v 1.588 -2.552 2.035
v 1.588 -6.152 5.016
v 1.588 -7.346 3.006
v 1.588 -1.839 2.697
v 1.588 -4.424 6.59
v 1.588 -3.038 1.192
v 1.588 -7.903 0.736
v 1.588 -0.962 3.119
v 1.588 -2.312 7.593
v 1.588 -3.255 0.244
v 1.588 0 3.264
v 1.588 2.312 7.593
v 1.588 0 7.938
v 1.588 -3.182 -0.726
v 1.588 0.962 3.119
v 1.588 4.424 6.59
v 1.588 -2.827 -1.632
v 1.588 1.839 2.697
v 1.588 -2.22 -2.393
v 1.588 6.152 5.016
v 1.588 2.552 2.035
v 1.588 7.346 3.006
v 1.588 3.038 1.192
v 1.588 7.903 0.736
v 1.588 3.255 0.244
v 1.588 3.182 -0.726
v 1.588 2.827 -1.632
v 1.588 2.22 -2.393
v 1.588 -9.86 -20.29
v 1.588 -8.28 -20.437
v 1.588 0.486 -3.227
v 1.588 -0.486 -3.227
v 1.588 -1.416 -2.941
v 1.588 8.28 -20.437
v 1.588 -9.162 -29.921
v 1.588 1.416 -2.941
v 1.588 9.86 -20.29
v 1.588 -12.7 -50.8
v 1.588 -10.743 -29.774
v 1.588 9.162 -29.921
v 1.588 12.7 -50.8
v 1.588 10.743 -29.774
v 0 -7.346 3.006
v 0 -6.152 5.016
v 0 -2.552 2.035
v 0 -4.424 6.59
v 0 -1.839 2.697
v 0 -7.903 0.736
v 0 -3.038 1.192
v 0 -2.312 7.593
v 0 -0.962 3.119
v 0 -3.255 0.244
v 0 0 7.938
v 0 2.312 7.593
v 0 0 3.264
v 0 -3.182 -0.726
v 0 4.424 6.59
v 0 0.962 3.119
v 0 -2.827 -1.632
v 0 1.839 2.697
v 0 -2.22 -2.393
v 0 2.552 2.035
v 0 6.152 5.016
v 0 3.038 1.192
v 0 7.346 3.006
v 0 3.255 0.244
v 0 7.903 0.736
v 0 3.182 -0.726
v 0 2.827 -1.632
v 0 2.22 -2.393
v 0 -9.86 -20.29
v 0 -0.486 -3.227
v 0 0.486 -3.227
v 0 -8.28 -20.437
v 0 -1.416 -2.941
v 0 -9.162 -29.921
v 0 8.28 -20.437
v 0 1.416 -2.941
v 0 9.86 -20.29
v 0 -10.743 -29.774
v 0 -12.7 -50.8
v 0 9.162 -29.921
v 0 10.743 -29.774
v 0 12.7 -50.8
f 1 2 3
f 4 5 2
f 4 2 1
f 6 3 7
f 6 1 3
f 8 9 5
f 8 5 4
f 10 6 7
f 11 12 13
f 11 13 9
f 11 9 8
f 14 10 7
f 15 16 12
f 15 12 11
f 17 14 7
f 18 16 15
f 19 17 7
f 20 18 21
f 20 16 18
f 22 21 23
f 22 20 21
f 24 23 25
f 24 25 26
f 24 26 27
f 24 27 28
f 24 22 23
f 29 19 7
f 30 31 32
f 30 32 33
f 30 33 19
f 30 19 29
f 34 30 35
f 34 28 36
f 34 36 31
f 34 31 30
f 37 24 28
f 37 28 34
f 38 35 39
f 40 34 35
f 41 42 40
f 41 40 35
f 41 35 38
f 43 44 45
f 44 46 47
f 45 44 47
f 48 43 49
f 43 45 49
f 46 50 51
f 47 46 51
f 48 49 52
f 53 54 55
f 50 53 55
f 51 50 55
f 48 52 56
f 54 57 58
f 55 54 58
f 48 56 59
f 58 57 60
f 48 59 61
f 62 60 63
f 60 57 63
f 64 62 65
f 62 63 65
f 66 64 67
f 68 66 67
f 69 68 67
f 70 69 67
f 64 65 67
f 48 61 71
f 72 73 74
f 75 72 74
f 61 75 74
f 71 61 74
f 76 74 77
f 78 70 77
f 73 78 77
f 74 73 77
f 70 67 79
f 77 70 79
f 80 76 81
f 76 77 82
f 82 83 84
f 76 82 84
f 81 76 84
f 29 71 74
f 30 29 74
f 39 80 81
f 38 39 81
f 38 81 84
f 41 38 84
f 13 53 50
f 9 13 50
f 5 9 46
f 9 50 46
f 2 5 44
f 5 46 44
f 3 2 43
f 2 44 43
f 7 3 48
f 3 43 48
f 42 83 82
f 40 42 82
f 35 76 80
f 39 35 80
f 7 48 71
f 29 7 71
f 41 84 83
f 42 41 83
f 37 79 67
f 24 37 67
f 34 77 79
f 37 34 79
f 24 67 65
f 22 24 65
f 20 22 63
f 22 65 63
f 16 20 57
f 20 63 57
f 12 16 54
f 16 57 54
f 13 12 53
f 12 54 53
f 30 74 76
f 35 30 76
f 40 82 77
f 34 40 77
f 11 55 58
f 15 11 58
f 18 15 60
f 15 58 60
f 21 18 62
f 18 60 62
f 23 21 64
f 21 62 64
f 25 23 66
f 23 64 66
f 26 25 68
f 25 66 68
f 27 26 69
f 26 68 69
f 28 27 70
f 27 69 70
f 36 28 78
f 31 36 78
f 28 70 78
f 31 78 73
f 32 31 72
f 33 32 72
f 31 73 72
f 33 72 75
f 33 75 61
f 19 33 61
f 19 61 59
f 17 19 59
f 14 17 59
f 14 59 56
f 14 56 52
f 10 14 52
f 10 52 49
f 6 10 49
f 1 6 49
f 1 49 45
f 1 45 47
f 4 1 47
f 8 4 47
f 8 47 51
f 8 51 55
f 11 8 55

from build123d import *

# Parameters (mm, degrees)
BOSS_EXTRUDE1_DEPTH     = 1.5875
F_1_4_CLEARANCE_HOLE1_D = 6.5278


with BuildPart() as part:
    # Sketch1 → Boss-Extrude1 (new body)
    with BuildSketch(Plane(origin=(0, 0, 0), x_dir=(0, 0, -1), z_dir=(1, 0, 0))):
        with BuildLine():
            ThreePointArc((-0.735600854, 7.903340916), (-5.86697273, 5.346263858), (-7.9375, 0))
            Line((-7.9375, 0), (50.8, 0))
            Line((50.8, 0), (50.8, 12.7))
            Line((50.8, 12.7), (29.774204123, 10.74303097))
            Line((29.774204123, 10.74303097), (29.921324293, 9.162362787))
            Line((29.921324293, 9.162362787), (20.437315194, 8.279641762))
            Line((20.437315194, 8.279641762), (20.290195023, 9.860309946))
            Line((20.290195023, 9.860309946), (-0.735600854, 7.903340916))
        make_face()
        with BuildLine():
            ThreePointArc((-7.9375, 0), (-5.86697273, -5.346263858), (-0.735600854, -7.903340916))
            Line((-0.735600854, -7.903340916), (20.290195023, -9.860309946))
            Line((20.290195023, -9.860309946), (20.437315194, -8.279641762))
            Line((20.437315194, -8.279641762), (29.921324293, -9.162362787))
            Line((29.921324293, -9.162362787), (29.774204123, -10.74303097))
            Line((29.774204123, -10.74303097), (50.8, -12.7))
            Line((50.8, -12.7), (50.8, 0))
            Line((50.8, 0), (-7.9375, 0))
        make_face()
    extrude(amount=BOSS_EXTRUDE1_DEPTH)

    # 1/4 Clearance Hole1 (through all)
    with Locations(Plane(origin=(1.5875, 0, 0), x_dir=(0, 0, -1), z_dir=(1, 0, 0))):
        with Locations((0, 0)):
            Hole(F_1_4_CLEARANCE_HOLE1_D / 2)


solid = part.part
